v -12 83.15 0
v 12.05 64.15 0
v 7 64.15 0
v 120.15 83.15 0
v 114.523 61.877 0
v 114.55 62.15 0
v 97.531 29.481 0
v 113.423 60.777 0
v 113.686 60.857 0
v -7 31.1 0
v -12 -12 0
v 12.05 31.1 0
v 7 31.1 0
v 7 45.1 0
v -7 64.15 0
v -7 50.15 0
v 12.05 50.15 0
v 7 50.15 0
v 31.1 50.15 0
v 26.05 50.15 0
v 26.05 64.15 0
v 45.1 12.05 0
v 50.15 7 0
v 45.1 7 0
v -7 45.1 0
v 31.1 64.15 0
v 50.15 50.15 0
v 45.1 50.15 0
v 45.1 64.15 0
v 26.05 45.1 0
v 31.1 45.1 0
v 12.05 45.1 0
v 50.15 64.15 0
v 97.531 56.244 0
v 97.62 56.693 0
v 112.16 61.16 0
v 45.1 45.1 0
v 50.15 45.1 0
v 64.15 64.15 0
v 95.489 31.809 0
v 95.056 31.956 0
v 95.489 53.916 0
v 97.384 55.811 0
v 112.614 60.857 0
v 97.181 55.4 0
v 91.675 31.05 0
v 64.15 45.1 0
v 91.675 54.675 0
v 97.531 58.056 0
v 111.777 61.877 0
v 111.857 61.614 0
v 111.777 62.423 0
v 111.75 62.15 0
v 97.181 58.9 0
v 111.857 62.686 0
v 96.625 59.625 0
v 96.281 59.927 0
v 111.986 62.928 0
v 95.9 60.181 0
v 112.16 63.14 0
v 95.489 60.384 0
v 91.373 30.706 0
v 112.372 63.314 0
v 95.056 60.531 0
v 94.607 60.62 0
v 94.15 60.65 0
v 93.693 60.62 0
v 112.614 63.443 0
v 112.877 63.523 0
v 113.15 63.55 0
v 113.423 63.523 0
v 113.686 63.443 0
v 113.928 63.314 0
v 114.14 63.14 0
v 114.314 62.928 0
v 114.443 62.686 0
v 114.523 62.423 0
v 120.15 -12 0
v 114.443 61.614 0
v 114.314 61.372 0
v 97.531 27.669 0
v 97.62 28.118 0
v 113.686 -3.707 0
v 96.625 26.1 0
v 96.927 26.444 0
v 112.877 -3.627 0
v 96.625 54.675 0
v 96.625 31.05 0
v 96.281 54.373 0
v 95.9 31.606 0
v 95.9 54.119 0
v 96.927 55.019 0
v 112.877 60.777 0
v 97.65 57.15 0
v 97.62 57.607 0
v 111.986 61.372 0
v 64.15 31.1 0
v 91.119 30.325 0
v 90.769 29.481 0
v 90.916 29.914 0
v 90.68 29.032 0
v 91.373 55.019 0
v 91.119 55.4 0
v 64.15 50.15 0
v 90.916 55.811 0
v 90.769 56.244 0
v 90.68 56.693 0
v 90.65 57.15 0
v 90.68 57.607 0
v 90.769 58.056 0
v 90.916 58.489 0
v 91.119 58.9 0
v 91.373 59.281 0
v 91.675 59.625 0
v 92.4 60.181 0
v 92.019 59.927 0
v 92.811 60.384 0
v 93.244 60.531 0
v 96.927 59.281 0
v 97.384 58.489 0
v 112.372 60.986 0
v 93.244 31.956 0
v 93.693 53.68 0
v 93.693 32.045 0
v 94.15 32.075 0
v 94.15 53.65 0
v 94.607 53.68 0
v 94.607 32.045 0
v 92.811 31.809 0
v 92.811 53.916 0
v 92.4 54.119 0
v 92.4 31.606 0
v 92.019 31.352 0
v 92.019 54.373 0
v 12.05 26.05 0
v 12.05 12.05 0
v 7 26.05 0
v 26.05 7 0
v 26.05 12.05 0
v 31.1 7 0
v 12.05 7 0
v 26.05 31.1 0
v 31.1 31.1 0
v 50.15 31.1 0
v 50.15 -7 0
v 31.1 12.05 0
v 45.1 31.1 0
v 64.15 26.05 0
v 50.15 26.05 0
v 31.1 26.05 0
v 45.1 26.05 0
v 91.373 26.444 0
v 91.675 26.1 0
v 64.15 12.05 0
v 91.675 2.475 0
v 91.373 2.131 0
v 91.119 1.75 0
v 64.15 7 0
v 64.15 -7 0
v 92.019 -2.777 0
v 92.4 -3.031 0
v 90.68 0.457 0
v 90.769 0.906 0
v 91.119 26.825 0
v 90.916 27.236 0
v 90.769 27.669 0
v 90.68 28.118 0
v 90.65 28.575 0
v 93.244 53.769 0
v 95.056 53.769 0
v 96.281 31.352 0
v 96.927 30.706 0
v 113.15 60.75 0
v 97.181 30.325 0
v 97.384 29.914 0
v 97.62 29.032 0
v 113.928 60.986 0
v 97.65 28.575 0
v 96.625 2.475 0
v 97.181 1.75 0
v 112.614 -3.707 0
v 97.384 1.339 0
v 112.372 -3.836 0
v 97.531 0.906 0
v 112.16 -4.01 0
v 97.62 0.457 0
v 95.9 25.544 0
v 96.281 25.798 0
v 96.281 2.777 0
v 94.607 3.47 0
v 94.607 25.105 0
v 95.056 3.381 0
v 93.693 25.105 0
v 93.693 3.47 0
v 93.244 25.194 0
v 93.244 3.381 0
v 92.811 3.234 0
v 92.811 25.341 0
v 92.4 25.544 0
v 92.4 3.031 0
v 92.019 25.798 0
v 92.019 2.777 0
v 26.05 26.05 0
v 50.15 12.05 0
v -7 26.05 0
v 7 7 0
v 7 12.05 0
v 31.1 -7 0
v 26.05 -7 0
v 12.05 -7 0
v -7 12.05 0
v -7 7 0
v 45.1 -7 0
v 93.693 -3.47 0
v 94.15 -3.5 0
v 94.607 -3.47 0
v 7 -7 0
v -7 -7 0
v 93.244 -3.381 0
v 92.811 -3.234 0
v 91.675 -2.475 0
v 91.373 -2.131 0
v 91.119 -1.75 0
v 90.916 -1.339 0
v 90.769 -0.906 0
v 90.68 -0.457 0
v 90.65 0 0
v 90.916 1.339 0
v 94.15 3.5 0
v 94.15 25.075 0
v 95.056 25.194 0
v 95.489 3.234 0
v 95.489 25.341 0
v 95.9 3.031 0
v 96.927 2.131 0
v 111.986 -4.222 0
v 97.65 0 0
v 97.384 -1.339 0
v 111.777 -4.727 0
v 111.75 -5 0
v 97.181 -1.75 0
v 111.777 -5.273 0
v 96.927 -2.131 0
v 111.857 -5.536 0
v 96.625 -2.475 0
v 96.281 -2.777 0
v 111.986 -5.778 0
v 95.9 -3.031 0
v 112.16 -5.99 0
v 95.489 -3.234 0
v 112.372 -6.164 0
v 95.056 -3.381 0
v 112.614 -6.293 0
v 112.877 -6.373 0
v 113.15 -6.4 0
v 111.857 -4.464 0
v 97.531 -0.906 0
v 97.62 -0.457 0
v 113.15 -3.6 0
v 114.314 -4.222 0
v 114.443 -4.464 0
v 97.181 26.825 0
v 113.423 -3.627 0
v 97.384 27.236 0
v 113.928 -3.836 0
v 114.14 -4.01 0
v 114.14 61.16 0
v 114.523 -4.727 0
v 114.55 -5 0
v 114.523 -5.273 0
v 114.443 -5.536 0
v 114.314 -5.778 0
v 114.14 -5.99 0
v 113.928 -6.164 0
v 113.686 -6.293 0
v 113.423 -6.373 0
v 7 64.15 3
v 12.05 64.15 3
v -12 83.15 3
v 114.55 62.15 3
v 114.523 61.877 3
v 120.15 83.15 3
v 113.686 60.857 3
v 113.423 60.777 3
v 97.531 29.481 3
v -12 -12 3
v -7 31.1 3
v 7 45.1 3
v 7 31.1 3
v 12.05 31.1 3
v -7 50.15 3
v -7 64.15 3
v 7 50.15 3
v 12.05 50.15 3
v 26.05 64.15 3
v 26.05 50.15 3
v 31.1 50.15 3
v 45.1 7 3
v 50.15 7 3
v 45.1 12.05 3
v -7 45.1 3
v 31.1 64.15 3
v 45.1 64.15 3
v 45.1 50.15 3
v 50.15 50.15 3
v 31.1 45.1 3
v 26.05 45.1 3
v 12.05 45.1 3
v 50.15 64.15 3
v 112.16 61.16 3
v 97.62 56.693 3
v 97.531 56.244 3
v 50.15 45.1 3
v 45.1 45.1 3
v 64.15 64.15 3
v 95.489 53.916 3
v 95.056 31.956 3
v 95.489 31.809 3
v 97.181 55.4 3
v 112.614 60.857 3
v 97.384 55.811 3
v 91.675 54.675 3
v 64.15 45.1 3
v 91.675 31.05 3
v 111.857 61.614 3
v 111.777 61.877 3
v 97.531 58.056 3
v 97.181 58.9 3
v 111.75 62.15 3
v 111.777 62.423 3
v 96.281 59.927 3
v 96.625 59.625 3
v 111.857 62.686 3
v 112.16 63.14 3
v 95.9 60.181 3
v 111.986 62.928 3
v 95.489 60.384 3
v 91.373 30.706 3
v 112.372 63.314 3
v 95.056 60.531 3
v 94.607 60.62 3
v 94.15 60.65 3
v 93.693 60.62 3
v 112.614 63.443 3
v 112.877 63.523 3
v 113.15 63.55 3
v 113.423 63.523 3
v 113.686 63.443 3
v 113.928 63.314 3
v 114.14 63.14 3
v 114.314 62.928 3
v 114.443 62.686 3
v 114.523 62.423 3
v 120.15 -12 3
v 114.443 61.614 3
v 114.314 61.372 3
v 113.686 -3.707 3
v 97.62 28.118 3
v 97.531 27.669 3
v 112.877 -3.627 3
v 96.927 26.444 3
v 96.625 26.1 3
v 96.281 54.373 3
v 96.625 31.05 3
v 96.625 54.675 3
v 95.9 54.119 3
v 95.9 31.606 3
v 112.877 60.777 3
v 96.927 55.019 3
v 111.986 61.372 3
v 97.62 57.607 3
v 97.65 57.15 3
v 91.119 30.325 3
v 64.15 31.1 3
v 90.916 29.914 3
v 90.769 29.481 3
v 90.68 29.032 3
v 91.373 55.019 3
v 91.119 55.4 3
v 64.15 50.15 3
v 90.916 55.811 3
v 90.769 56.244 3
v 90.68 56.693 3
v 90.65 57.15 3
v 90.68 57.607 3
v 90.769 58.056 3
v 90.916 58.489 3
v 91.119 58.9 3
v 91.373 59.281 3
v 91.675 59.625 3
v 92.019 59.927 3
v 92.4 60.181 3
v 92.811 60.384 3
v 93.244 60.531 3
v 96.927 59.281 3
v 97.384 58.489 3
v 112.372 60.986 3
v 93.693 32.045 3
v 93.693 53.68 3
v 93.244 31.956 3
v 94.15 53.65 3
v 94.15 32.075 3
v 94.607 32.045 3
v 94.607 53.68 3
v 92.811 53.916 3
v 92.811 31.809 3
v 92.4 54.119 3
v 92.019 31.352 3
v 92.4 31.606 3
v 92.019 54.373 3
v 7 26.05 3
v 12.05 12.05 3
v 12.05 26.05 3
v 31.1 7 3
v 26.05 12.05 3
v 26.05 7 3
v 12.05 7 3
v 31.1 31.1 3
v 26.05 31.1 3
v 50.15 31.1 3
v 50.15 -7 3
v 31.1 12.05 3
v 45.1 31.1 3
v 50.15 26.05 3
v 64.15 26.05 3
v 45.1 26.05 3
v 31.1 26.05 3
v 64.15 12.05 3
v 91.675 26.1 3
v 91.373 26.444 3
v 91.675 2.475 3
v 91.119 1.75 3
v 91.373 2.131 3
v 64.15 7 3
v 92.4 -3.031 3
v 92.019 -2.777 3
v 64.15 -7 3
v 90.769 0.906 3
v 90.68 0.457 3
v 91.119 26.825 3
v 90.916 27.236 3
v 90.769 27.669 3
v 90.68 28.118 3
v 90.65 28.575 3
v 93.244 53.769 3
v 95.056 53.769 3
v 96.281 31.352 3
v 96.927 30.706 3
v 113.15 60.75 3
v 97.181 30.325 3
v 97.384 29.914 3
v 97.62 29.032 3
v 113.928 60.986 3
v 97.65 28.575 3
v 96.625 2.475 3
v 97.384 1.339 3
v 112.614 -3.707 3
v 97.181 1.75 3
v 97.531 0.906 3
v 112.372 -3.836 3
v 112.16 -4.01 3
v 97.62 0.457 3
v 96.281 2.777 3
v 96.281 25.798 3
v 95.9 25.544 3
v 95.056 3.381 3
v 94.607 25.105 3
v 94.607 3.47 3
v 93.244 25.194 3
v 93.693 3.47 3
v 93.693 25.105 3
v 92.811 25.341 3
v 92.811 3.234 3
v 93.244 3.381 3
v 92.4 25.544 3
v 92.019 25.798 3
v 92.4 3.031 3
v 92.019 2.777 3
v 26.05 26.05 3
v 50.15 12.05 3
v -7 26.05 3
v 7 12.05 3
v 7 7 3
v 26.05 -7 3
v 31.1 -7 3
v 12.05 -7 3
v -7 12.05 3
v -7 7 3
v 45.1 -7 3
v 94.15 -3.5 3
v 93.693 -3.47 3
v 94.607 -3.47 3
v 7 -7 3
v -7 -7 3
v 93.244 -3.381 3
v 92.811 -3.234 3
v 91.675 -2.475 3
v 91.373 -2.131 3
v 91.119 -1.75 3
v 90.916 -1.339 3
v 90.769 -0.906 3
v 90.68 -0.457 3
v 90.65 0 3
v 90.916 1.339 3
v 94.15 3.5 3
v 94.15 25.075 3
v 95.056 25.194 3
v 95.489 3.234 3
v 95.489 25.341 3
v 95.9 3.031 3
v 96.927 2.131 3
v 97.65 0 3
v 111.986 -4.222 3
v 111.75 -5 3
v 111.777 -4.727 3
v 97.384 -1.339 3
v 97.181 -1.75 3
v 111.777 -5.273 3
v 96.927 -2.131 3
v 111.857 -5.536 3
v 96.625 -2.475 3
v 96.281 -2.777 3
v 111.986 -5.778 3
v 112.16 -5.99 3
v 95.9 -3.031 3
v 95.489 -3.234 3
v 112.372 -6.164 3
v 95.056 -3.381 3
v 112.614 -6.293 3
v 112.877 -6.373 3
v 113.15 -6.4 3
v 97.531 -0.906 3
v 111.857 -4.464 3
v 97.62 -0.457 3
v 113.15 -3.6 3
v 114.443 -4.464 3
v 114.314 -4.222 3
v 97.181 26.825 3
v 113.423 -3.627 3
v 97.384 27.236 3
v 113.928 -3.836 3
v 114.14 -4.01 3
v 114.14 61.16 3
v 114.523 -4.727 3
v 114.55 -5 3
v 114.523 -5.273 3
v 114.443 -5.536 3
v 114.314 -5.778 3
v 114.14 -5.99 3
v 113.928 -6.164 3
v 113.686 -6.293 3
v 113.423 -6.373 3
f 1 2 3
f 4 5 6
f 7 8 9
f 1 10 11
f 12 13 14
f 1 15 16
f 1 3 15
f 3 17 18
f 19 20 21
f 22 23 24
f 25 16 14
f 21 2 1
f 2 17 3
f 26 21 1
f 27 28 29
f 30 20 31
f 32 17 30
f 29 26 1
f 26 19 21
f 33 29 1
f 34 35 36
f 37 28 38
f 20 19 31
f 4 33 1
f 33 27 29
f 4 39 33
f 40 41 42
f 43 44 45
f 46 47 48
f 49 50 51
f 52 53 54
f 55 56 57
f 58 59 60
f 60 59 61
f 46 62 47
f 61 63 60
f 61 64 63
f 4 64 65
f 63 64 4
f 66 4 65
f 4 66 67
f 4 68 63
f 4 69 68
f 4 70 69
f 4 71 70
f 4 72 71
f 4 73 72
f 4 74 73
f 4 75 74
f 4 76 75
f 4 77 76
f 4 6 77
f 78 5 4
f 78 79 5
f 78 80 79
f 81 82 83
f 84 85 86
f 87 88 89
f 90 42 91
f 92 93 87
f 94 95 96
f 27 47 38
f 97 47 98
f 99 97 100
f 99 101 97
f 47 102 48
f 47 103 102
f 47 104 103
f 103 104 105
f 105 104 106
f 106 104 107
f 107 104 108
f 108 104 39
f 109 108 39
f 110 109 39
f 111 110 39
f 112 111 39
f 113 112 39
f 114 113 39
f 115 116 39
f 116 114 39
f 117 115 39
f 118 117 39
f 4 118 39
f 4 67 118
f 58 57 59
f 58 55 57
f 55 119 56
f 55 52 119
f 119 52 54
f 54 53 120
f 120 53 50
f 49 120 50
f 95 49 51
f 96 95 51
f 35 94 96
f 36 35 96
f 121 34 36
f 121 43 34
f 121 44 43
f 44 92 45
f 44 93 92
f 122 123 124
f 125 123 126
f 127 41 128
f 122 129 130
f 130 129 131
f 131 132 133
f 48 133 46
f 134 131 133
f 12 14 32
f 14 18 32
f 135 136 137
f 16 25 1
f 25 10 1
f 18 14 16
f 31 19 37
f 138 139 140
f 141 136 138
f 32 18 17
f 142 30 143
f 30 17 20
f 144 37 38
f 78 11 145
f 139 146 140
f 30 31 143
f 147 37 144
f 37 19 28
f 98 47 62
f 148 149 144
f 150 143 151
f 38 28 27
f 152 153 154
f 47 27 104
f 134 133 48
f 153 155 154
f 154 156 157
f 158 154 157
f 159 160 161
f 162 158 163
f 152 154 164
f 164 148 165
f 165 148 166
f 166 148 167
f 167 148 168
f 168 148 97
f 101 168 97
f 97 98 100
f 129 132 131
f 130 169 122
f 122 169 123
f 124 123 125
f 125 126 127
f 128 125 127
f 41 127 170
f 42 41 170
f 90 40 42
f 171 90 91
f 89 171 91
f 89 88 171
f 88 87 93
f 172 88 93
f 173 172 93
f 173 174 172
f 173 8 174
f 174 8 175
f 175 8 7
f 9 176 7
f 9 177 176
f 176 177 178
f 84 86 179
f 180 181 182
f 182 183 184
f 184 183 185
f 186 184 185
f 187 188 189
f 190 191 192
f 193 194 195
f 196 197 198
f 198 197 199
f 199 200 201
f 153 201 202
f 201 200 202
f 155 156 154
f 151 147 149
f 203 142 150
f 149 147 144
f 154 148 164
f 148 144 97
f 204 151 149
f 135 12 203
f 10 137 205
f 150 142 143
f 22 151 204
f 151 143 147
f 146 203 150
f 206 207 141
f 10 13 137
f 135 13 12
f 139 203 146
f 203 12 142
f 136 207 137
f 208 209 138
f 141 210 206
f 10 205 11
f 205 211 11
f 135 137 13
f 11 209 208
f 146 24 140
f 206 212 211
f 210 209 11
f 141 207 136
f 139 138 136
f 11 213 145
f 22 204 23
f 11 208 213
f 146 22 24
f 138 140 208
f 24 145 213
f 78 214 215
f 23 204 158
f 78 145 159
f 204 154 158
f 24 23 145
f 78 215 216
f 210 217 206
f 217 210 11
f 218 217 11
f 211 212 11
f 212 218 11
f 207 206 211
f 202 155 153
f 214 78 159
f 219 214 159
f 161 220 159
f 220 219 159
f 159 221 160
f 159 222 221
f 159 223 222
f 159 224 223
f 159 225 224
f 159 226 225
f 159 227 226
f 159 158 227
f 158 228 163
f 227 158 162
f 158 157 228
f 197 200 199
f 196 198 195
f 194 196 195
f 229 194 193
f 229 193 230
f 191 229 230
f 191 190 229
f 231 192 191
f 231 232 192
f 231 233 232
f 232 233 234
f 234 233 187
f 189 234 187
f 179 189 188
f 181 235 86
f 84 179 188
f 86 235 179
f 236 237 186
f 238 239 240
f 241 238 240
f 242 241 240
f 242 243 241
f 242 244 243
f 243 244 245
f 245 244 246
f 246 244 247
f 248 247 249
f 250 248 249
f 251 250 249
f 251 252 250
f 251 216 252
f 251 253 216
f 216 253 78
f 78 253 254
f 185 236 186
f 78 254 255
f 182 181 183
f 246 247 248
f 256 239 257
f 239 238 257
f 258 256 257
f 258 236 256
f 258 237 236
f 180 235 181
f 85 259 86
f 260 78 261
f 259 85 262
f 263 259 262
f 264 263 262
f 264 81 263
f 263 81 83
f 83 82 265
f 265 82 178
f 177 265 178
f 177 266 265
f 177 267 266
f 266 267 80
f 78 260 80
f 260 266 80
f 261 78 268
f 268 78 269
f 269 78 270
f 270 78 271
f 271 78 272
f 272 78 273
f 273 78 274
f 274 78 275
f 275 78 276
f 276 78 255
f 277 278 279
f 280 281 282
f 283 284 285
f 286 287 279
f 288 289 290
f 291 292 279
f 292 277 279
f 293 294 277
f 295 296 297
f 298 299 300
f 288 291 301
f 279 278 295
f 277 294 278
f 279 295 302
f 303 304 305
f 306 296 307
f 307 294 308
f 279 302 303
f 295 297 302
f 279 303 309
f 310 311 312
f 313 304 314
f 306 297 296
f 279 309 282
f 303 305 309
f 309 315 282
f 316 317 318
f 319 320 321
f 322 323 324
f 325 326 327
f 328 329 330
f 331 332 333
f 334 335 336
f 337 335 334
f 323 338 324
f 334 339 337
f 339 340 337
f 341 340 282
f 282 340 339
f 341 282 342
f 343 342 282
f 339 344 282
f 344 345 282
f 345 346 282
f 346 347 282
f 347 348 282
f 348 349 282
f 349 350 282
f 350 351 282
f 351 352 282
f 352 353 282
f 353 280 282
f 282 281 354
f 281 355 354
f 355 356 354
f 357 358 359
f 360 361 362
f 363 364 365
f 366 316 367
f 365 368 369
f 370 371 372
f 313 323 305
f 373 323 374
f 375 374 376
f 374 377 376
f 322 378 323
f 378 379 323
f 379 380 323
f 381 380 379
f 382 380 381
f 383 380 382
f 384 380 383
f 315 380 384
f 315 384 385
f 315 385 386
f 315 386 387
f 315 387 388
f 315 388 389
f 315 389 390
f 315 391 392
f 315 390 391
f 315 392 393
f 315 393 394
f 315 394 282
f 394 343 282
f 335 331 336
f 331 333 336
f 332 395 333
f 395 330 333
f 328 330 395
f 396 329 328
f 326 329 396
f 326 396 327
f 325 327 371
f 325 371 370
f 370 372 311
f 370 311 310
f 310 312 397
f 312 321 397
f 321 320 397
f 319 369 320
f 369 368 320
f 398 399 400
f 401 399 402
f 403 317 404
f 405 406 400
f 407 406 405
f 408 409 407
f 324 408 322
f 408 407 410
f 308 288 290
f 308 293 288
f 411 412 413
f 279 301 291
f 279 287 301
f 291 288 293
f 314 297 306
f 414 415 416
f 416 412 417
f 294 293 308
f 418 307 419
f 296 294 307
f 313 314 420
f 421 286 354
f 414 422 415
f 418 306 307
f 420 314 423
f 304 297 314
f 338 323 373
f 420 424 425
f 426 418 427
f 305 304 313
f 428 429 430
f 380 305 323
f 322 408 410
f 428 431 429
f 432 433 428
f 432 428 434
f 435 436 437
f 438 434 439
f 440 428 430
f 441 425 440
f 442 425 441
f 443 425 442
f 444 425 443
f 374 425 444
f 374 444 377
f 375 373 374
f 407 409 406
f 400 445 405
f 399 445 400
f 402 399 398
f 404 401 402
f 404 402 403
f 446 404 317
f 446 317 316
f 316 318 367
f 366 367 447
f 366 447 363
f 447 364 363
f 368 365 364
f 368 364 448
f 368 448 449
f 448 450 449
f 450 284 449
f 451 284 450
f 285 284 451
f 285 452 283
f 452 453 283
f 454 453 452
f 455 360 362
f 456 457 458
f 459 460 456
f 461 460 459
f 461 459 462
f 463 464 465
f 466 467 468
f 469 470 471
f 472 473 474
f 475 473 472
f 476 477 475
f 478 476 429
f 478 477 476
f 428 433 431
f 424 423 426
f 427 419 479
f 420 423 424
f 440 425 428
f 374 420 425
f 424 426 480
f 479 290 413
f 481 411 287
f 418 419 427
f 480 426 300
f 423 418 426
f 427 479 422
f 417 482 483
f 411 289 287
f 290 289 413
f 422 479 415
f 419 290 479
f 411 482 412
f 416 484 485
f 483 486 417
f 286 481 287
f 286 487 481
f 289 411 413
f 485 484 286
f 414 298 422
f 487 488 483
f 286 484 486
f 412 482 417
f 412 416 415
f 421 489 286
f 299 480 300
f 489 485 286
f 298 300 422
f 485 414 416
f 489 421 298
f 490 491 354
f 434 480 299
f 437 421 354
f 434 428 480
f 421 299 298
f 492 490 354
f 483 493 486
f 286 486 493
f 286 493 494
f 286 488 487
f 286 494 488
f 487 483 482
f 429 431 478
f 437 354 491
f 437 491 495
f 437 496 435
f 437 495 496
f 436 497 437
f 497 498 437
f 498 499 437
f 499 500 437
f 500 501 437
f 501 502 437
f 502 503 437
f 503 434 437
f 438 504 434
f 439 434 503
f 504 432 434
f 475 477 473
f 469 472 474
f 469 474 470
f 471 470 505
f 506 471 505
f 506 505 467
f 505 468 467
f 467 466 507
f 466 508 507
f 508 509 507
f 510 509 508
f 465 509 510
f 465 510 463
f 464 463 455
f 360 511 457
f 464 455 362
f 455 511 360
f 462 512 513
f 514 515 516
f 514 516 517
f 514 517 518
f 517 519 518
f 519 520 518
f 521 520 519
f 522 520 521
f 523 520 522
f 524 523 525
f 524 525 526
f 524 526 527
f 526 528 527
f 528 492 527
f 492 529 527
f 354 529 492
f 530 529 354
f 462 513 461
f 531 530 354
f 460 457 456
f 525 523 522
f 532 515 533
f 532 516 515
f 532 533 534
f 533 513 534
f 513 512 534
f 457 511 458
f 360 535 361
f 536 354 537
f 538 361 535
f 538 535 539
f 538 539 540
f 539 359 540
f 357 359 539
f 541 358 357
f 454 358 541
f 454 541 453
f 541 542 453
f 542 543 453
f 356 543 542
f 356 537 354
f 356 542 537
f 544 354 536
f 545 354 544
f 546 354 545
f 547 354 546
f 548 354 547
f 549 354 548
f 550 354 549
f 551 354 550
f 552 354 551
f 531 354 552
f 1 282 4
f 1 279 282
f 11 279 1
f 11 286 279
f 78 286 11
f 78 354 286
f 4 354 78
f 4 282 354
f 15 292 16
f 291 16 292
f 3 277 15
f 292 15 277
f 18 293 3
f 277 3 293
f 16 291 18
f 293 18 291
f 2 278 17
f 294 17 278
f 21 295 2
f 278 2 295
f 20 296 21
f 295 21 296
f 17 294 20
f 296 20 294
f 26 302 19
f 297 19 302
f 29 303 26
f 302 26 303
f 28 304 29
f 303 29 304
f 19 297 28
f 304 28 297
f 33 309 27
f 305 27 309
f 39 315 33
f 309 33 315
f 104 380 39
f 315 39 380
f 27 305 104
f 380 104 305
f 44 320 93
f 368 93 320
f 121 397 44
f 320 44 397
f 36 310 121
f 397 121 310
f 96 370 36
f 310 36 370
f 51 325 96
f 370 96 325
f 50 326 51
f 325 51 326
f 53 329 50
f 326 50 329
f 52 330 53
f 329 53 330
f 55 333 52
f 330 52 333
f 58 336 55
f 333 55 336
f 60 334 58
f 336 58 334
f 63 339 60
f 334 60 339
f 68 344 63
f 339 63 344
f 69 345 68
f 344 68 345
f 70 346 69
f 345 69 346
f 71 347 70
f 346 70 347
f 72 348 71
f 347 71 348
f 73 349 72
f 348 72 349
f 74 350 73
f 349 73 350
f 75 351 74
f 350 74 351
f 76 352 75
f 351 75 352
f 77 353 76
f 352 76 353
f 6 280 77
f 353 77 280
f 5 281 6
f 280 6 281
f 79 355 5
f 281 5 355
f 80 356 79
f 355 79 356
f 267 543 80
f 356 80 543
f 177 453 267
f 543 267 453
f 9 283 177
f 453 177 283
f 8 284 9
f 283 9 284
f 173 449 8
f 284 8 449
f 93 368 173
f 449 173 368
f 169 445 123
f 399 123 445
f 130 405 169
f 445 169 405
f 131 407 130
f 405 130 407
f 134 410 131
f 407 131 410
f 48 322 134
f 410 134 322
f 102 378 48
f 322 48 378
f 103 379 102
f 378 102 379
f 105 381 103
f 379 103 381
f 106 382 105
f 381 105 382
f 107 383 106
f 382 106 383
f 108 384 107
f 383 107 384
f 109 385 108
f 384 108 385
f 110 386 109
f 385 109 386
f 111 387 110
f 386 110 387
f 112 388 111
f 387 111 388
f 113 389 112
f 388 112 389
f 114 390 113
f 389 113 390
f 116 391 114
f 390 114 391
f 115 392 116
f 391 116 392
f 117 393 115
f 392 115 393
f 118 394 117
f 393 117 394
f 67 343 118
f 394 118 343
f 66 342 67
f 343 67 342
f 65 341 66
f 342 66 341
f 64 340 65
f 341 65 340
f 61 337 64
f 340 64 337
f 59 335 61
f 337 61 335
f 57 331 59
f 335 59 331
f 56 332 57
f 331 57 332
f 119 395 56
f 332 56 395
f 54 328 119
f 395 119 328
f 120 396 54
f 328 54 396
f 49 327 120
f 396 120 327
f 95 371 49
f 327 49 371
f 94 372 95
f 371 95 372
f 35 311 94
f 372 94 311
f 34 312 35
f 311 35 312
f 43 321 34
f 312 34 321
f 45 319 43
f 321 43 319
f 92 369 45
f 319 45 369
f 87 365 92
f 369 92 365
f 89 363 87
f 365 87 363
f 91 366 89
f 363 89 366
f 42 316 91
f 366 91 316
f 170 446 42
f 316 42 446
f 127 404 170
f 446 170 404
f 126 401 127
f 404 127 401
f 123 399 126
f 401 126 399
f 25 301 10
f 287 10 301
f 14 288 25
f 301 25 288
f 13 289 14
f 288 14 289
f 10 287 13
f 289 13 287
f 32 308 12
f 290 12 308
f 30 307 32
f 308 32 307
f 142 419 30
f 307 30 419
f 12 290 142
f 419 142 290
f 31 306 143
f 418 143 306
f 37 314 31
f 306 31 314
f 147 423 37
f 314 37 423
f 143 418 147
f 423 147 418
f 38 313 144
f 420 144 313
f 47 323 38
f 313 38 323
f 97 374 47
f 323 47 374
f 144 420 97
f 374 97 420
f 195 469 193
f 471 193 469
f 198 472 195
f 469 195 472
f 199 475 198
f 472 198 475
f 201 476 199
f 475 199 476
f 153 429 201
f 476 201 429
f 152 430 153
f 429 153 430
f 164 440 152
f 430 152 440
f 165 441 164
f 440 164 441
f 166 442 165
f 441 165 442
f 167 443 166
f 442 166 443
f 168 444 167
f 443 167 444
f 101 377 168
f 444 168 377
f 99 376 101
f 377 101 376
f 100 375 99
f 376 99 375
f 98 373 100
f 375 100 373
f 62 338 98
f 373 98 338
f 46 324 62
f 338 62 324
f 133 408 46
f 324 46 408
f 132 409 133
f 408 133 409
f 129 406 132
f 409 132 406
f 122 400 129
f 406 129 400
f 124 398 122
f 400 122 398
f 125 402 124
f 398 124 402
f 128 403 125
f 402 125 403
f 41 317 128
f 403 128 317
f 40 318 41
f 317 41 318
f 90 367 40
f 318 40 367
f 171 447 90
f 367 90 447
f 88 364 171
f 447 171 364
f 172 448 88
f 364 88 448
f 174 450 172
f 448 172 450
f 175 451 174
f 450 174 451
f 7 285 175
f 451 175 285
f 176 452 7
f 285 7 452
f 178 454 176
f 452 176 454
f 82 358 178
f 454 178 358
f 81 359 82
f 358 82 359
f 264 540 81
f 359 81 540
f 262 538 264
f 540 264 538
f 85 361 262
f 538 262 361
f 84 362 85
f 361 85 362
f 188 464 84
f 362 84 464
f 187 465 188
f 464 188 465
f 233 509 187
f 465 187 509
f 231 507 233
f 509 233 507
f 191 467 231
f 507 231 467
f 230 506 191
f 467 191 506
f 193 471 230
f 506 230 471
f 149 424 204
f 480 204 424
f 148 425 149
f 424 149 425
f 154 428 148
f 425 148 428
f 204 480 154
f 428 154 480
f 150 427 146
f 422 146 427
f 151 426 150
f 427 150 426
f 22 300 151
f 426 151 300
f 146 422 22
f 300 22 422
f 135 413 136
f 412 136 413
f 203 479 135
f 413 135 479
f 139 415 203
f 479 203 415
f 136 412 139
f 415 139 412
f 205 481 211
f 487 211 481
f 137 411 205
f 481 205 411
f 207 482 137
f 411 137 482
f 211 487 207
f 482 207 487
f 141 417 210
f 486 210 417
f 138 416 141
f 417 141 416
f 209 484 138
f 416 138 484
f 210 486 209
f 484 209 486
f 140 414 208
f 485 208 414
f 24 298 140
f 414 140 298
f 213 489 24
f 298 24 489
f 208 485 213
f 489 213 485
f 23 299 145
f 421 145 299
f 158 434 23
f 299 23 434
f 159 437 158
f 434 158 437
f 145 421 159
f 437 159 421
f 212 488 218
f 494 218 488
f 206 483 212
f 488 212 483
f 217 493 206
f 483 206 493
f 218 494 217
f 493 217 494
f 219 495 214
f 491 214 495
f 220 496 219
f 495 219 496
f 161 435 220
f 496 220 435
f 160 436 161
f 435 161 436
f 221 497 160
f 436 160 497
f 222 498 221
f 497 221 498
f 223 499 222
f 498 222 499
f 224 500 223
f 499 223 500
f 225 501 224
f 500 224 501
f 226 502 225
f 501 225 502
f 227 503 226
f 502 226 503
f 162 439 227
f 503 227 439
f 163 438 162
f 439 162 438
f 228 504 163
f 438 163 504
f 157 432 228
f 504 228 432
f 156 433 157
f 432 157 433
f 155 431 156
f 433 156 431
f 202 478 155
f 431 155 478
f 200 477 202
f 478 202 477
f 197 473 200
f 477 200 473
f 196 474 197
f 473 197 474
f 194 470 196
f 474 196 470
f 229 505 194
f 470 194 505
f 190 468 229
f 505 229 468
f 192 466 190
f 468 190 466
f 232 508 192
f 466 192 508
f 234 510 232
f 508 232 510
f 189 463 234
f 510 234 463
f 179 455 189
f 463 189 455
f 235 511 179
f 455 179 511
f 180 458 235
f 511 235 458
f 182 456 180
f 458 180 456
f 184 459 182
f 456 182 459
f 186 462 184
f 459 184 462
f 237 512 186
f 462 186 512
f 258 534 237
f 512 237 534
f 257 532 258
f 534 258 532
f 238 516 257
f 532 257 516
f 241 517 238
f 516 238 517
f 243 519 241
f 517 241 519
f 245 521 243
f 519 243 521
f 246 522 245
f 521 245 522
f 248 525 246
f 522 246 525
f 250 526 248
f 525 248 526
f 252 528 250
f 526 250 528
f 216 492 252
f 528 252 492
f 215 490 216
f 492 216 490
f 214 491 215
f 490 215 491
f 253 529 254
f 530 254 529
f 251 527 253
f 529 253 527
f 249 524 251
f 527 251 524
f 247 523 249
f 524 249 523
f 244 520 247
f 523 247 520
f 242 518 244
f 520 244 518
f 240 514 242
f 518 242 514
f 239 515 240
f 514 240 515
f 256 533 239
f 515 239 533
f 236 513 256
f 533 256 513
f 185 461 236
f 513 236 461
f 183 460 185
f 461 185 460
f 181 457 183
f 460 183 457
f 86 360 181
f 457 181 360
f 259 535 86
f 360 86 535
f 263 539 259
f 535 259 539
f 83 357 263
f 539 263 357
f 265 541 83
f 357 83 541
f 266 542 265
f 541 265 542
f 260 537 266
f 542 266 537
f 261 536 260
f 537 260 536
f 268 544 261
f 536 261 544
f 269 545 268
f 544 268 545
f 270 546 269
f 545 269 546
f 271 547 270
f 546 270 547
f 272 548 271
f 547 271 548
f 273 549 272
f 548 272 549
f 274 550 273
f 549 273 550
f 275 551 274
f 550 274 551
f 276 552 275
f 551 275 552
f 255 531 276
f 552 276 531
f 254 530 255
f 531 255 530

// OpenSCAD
// Stream Deck Macro — top plate, v1
// Inspired by MisteRdeck (printables.com/model/134529) layout concept only —
// no files/geometry copied, built fresh for our own parts.

// === Parameters (all adjustable) ===
switch_hole    = 14;     // Outemu plate-mount square cutout, mm
switch_pitch   = 19.05;  // standard MX-compatible keycap spacing, mm
grid_cols      = 4;
grid_rows      = 4;

encoder_hole_d = 7;      // EC11 threaded bushing diameter — PLACEHOLDER, measure real part
encoder_count  = 3;
encoder_gap    = 30;     // gap from switch grid edge to encoder column, mm

margin         = 12;     // plate edge margin, mm
plate_thickness = 3;     // mm

screw_hole_d   = 2.8;    // M3 self-tapping pilot hole, mm
screw_inset    = 7;      // distance from plate edge to screw center, mm

// === Derived ===
grid_width  = (grid_cols - 1) * switch_pitch;
grid_height = (grid_rows - 1) * switch_pitch;

plate_width  = grid_width + switch_hole + encoder_gap + encoder_hole_d + margin * 2;
plate_height = grid_height + switch_hole + margin * 2;

module switch_grid() {
    for (row = [0 : grid_rows - 1])
        for (col = [0 : grid_cols - 1])
            translate([col * switch_pitch, row * switch_pitch])
                square(switch_hole, center = true);
}

module encoder_column() {
    x = grid_width + switch_hole / 2 + encoder_gap;
    spacing = grid_height / (encoder_count - 1);
    for (i = [0 : encoder_count - 1])
        translate([x, i * spacing])
            circle(d = encoder_hole_d, $fn = 48);
}

module screw_holes() {
    x0 = -margin + screw_inset;
    x1 = grid_width + switch_hole + encoder_gap + encoder_hole_d + margin - screw_inset;
    y0 = -margin + screw_inset;
    y1 = grid_height + margin - screw_inset;
    positions = [[x0, y0], [x1, y0], [x0, y1], [x1, y1]];
    for (p = positions)
        translate(p) circle(d = screw_hole_d, $fn = 32);
}

module plate_outline() {
    translate([-margin, -margin])
        square([plate_width, plate_height]);
}

module plate_2d() {
    difference() {
        plate_outline();
        switch_grid();
        encoder_column();
        screw_holes();
    }
}

linear_extrude(height = plate_thickness)
    plate_2d();
